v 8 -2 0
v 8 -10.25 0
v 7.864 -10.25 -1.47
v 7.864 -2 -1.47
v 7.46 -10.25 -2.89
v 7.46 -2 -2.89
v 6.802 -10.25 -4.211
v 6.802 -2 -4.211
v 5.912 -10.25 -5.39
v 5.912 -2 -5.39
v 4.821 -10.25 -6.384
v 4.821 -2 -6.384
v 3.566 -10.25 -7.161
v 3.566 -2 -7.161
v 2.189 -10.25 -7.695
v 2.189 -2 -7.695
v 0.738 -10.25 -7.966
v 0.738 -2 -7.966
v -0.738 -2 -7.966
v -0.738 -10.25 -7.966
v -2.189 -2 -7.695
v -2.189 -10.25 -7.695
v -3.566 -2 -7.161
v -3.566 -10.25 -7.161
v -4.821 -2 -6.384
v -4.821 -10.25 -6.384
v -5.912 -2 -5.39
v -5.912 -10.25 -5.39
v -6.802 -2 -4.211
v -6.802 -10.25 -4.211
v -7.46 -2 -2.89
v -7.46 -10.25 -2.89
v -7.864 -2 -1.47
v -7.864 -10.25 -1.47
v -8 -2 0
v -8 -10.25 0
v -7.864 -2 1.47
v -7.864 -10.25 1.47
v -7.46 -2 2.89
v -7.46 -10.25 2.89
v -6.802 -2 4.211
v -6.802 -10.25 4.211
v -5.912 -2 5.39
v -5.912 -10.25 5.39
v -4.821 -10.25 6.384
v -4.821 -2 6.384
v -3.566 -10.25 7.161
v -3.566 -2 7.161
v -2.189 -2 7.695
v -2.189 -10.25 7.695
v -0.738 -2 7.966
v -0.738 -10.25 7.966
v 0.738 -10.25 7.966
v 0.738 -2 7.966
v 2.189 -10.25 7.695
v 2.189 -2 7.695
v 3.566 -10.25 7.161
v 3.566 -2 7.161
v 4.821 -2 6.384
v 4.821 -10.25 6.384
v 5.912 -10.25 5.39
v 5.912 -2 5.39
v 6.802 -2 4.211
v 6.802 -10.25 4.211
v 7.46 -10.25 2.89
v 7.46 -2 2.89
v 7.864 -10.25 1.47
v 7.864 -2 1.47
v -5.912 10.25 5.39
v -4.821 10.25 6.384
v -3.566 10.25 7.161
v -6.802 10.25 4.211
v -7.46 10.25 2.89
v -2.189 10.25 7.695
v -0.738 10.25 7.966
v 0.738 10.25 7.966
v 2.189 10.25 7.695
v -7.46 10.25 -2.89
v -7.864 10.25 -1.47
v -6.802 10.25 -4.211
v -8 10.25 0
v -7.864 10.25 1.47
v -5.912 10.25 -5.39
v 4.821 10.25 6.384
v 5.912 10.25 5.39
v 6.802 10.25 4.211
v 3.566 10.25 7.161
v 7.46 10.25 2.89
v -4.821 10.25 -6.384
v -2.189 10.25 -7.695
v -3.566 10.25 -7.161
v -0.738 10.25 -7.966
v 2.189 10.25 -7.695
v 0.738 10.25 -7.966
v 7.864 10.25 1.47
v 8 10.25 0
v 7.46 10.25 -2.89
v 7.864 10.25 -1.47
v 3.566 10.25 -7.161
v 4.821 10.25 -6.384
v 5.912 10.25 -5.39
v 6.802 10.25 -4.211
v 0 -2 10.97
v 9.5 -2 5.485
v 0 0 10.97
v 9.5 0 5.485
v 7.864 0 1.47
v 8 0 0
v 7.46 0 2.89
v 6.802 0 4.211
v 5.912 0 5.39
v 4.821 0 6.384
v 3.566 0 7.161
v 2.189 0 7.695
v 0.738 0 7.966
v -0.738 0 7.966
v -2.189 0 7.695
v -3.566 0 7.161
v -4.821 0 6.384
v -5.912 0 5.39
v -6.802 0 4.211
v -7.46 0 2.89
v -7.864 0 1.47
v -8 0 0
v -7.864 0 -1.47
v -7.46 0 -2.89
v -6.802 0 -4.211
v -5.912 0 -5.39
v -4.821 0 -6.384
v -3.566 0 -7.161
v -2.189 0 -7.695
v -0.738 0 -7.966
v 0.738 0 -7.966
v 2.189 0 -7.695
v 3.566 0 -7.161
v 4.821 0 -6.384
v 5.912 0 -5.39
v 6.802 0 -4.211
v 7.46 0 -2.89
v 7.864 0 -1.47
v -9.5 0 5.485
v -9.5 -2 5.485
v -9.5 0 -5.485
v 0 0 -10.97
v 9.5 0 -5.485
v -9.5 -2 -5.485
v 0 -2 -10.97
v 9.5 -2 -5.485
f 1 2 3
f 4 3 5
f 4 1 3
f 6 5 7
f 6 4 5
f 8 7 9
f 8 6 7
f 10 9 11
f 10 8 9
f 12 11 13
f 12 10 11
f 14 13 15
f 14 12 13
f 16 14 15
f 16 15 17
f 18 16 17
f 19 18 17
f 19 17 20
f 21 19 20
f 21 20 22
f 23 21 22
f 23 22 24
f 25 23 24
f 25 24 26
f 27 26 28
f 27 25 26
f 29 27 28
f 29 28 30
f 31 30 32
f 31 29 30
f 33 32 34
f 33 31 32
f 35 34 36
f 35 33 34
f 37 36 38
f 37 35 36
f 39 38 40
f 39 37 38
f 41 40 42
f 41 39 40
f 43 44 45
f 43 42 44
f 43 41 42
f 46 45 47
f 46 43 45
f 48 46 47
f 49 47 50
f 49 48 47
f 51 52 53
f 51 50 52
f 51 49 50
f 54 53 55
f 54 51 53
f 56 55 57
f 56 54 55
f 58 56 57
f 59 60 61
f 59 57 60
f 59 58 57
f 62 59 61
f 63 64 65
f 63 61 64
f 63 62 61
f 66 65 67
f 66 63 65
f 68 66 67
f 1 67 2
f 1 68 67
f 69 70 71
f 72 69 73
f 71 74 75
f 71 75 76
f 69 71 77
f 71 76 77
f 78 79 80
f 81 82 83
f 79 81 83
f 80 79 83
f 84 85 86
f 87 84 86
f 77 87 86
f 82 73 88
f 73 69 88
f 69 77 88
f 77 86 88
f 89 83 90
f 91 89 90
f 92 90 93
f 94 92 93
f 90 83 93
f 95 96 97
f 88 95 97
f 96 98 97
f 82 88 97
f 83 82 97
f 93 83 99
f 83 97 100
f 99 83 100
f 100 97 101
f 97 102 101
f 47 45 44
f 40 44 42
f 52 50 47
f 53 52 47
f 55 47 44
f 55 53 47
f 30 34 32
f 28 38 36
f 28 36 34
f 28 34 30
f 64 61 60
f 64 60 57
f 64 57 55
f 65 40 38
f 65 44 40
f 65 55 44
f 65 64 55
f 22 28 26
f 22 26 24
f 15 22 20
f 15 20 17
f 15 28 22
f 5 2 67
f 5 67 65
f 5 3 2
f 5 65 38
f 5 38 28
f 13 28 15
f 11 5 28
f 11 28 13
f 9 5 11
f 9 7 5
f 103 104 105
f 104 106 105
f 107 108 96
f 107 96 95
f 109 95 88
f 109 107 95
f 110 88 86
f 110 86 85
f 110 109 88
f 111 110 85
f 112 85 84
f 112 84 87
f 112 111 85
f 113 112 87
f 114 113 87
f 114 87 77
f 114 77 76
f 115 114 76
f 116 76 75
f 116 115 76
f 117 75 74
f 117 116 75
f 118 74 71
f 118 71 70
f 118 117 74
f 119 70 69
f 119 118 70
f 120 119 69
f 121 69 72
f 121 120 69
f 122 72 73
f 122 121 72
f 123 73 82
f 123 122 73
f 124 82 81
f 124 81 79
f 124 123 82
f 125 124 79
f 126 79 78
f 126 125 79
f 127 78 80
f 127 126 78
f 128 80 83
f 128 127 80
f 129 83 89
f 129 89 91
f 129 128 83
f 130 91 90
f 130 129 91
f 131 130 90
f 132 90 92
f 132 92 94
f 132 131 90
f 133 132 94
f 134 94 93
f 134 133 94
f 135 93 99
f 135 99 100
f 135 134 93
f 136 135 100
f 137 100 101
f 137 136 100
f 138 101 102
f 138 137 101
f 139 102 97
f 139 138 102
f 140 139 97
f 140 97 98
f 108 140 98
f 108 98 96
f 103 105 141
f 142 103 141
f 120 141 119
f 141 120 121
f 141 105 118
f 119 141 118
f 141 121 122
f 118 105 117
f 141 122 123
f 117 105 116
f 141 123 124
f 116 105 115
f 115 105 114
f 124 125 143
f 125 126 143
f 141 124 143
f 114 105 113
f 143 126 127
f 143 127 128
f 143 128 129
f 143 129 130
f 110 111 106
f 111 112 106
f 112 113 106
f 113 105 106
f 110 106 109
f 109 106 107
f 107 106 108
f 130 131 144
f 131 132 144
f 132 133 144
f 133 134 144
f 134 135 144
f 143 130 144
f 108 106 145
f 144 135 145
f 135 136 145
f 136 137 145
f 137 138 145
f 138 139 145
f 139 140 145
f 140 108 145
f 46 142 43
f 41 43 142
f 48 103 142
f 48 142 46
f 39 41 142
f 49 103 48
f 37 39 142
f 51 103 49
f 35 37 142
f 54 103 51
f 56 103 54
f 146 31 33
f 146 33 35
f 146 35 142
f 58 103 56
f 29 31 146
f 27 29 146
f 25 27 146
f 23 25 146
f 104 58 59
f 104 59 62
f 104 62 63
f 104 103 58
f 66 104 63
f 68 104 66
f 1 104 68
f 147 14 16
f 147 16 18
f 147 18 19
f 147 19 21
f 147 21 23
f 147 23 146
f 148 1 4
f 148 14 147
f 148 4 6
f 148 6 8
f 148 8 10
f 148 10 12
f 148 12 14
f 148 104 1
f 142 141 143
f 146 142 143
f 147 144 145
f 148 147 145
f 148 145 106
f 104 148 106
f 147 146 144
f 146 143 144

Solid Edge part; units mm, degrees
sketch "Sketch1" plane through (0, 0, 0) normal (0, -1, 0) x (1, 0, 0)
  circle A0 centre (0, 0) radius 8
extrude "Protrusion1" add sketch "Sketch1" along normal mid plane 20.5
sketch "Sketch2" plane through (0, 0, 0) normal (0, -1, 0) x (1, 0, 0)
  line L0 (0, 10.9697) -> (-9.5, 5.4848)
  line L1 (-9.5, 5.4848) -> (-9.5, -5.4848)
  line L2 (-9.5, -5.4848) -> (0, -10.9697)
  line L3 (0, -10.9697) -> (9.5, -5.4848)
  line L4 (9.5, -5.4848) -> (9.5, 5.4848)
  line L5 (9.5, 5.4848) -> (0, 10.9697)
extrude "ExtrudedProtrusion_2" add sketch "Sketch2" along normal blind 2
